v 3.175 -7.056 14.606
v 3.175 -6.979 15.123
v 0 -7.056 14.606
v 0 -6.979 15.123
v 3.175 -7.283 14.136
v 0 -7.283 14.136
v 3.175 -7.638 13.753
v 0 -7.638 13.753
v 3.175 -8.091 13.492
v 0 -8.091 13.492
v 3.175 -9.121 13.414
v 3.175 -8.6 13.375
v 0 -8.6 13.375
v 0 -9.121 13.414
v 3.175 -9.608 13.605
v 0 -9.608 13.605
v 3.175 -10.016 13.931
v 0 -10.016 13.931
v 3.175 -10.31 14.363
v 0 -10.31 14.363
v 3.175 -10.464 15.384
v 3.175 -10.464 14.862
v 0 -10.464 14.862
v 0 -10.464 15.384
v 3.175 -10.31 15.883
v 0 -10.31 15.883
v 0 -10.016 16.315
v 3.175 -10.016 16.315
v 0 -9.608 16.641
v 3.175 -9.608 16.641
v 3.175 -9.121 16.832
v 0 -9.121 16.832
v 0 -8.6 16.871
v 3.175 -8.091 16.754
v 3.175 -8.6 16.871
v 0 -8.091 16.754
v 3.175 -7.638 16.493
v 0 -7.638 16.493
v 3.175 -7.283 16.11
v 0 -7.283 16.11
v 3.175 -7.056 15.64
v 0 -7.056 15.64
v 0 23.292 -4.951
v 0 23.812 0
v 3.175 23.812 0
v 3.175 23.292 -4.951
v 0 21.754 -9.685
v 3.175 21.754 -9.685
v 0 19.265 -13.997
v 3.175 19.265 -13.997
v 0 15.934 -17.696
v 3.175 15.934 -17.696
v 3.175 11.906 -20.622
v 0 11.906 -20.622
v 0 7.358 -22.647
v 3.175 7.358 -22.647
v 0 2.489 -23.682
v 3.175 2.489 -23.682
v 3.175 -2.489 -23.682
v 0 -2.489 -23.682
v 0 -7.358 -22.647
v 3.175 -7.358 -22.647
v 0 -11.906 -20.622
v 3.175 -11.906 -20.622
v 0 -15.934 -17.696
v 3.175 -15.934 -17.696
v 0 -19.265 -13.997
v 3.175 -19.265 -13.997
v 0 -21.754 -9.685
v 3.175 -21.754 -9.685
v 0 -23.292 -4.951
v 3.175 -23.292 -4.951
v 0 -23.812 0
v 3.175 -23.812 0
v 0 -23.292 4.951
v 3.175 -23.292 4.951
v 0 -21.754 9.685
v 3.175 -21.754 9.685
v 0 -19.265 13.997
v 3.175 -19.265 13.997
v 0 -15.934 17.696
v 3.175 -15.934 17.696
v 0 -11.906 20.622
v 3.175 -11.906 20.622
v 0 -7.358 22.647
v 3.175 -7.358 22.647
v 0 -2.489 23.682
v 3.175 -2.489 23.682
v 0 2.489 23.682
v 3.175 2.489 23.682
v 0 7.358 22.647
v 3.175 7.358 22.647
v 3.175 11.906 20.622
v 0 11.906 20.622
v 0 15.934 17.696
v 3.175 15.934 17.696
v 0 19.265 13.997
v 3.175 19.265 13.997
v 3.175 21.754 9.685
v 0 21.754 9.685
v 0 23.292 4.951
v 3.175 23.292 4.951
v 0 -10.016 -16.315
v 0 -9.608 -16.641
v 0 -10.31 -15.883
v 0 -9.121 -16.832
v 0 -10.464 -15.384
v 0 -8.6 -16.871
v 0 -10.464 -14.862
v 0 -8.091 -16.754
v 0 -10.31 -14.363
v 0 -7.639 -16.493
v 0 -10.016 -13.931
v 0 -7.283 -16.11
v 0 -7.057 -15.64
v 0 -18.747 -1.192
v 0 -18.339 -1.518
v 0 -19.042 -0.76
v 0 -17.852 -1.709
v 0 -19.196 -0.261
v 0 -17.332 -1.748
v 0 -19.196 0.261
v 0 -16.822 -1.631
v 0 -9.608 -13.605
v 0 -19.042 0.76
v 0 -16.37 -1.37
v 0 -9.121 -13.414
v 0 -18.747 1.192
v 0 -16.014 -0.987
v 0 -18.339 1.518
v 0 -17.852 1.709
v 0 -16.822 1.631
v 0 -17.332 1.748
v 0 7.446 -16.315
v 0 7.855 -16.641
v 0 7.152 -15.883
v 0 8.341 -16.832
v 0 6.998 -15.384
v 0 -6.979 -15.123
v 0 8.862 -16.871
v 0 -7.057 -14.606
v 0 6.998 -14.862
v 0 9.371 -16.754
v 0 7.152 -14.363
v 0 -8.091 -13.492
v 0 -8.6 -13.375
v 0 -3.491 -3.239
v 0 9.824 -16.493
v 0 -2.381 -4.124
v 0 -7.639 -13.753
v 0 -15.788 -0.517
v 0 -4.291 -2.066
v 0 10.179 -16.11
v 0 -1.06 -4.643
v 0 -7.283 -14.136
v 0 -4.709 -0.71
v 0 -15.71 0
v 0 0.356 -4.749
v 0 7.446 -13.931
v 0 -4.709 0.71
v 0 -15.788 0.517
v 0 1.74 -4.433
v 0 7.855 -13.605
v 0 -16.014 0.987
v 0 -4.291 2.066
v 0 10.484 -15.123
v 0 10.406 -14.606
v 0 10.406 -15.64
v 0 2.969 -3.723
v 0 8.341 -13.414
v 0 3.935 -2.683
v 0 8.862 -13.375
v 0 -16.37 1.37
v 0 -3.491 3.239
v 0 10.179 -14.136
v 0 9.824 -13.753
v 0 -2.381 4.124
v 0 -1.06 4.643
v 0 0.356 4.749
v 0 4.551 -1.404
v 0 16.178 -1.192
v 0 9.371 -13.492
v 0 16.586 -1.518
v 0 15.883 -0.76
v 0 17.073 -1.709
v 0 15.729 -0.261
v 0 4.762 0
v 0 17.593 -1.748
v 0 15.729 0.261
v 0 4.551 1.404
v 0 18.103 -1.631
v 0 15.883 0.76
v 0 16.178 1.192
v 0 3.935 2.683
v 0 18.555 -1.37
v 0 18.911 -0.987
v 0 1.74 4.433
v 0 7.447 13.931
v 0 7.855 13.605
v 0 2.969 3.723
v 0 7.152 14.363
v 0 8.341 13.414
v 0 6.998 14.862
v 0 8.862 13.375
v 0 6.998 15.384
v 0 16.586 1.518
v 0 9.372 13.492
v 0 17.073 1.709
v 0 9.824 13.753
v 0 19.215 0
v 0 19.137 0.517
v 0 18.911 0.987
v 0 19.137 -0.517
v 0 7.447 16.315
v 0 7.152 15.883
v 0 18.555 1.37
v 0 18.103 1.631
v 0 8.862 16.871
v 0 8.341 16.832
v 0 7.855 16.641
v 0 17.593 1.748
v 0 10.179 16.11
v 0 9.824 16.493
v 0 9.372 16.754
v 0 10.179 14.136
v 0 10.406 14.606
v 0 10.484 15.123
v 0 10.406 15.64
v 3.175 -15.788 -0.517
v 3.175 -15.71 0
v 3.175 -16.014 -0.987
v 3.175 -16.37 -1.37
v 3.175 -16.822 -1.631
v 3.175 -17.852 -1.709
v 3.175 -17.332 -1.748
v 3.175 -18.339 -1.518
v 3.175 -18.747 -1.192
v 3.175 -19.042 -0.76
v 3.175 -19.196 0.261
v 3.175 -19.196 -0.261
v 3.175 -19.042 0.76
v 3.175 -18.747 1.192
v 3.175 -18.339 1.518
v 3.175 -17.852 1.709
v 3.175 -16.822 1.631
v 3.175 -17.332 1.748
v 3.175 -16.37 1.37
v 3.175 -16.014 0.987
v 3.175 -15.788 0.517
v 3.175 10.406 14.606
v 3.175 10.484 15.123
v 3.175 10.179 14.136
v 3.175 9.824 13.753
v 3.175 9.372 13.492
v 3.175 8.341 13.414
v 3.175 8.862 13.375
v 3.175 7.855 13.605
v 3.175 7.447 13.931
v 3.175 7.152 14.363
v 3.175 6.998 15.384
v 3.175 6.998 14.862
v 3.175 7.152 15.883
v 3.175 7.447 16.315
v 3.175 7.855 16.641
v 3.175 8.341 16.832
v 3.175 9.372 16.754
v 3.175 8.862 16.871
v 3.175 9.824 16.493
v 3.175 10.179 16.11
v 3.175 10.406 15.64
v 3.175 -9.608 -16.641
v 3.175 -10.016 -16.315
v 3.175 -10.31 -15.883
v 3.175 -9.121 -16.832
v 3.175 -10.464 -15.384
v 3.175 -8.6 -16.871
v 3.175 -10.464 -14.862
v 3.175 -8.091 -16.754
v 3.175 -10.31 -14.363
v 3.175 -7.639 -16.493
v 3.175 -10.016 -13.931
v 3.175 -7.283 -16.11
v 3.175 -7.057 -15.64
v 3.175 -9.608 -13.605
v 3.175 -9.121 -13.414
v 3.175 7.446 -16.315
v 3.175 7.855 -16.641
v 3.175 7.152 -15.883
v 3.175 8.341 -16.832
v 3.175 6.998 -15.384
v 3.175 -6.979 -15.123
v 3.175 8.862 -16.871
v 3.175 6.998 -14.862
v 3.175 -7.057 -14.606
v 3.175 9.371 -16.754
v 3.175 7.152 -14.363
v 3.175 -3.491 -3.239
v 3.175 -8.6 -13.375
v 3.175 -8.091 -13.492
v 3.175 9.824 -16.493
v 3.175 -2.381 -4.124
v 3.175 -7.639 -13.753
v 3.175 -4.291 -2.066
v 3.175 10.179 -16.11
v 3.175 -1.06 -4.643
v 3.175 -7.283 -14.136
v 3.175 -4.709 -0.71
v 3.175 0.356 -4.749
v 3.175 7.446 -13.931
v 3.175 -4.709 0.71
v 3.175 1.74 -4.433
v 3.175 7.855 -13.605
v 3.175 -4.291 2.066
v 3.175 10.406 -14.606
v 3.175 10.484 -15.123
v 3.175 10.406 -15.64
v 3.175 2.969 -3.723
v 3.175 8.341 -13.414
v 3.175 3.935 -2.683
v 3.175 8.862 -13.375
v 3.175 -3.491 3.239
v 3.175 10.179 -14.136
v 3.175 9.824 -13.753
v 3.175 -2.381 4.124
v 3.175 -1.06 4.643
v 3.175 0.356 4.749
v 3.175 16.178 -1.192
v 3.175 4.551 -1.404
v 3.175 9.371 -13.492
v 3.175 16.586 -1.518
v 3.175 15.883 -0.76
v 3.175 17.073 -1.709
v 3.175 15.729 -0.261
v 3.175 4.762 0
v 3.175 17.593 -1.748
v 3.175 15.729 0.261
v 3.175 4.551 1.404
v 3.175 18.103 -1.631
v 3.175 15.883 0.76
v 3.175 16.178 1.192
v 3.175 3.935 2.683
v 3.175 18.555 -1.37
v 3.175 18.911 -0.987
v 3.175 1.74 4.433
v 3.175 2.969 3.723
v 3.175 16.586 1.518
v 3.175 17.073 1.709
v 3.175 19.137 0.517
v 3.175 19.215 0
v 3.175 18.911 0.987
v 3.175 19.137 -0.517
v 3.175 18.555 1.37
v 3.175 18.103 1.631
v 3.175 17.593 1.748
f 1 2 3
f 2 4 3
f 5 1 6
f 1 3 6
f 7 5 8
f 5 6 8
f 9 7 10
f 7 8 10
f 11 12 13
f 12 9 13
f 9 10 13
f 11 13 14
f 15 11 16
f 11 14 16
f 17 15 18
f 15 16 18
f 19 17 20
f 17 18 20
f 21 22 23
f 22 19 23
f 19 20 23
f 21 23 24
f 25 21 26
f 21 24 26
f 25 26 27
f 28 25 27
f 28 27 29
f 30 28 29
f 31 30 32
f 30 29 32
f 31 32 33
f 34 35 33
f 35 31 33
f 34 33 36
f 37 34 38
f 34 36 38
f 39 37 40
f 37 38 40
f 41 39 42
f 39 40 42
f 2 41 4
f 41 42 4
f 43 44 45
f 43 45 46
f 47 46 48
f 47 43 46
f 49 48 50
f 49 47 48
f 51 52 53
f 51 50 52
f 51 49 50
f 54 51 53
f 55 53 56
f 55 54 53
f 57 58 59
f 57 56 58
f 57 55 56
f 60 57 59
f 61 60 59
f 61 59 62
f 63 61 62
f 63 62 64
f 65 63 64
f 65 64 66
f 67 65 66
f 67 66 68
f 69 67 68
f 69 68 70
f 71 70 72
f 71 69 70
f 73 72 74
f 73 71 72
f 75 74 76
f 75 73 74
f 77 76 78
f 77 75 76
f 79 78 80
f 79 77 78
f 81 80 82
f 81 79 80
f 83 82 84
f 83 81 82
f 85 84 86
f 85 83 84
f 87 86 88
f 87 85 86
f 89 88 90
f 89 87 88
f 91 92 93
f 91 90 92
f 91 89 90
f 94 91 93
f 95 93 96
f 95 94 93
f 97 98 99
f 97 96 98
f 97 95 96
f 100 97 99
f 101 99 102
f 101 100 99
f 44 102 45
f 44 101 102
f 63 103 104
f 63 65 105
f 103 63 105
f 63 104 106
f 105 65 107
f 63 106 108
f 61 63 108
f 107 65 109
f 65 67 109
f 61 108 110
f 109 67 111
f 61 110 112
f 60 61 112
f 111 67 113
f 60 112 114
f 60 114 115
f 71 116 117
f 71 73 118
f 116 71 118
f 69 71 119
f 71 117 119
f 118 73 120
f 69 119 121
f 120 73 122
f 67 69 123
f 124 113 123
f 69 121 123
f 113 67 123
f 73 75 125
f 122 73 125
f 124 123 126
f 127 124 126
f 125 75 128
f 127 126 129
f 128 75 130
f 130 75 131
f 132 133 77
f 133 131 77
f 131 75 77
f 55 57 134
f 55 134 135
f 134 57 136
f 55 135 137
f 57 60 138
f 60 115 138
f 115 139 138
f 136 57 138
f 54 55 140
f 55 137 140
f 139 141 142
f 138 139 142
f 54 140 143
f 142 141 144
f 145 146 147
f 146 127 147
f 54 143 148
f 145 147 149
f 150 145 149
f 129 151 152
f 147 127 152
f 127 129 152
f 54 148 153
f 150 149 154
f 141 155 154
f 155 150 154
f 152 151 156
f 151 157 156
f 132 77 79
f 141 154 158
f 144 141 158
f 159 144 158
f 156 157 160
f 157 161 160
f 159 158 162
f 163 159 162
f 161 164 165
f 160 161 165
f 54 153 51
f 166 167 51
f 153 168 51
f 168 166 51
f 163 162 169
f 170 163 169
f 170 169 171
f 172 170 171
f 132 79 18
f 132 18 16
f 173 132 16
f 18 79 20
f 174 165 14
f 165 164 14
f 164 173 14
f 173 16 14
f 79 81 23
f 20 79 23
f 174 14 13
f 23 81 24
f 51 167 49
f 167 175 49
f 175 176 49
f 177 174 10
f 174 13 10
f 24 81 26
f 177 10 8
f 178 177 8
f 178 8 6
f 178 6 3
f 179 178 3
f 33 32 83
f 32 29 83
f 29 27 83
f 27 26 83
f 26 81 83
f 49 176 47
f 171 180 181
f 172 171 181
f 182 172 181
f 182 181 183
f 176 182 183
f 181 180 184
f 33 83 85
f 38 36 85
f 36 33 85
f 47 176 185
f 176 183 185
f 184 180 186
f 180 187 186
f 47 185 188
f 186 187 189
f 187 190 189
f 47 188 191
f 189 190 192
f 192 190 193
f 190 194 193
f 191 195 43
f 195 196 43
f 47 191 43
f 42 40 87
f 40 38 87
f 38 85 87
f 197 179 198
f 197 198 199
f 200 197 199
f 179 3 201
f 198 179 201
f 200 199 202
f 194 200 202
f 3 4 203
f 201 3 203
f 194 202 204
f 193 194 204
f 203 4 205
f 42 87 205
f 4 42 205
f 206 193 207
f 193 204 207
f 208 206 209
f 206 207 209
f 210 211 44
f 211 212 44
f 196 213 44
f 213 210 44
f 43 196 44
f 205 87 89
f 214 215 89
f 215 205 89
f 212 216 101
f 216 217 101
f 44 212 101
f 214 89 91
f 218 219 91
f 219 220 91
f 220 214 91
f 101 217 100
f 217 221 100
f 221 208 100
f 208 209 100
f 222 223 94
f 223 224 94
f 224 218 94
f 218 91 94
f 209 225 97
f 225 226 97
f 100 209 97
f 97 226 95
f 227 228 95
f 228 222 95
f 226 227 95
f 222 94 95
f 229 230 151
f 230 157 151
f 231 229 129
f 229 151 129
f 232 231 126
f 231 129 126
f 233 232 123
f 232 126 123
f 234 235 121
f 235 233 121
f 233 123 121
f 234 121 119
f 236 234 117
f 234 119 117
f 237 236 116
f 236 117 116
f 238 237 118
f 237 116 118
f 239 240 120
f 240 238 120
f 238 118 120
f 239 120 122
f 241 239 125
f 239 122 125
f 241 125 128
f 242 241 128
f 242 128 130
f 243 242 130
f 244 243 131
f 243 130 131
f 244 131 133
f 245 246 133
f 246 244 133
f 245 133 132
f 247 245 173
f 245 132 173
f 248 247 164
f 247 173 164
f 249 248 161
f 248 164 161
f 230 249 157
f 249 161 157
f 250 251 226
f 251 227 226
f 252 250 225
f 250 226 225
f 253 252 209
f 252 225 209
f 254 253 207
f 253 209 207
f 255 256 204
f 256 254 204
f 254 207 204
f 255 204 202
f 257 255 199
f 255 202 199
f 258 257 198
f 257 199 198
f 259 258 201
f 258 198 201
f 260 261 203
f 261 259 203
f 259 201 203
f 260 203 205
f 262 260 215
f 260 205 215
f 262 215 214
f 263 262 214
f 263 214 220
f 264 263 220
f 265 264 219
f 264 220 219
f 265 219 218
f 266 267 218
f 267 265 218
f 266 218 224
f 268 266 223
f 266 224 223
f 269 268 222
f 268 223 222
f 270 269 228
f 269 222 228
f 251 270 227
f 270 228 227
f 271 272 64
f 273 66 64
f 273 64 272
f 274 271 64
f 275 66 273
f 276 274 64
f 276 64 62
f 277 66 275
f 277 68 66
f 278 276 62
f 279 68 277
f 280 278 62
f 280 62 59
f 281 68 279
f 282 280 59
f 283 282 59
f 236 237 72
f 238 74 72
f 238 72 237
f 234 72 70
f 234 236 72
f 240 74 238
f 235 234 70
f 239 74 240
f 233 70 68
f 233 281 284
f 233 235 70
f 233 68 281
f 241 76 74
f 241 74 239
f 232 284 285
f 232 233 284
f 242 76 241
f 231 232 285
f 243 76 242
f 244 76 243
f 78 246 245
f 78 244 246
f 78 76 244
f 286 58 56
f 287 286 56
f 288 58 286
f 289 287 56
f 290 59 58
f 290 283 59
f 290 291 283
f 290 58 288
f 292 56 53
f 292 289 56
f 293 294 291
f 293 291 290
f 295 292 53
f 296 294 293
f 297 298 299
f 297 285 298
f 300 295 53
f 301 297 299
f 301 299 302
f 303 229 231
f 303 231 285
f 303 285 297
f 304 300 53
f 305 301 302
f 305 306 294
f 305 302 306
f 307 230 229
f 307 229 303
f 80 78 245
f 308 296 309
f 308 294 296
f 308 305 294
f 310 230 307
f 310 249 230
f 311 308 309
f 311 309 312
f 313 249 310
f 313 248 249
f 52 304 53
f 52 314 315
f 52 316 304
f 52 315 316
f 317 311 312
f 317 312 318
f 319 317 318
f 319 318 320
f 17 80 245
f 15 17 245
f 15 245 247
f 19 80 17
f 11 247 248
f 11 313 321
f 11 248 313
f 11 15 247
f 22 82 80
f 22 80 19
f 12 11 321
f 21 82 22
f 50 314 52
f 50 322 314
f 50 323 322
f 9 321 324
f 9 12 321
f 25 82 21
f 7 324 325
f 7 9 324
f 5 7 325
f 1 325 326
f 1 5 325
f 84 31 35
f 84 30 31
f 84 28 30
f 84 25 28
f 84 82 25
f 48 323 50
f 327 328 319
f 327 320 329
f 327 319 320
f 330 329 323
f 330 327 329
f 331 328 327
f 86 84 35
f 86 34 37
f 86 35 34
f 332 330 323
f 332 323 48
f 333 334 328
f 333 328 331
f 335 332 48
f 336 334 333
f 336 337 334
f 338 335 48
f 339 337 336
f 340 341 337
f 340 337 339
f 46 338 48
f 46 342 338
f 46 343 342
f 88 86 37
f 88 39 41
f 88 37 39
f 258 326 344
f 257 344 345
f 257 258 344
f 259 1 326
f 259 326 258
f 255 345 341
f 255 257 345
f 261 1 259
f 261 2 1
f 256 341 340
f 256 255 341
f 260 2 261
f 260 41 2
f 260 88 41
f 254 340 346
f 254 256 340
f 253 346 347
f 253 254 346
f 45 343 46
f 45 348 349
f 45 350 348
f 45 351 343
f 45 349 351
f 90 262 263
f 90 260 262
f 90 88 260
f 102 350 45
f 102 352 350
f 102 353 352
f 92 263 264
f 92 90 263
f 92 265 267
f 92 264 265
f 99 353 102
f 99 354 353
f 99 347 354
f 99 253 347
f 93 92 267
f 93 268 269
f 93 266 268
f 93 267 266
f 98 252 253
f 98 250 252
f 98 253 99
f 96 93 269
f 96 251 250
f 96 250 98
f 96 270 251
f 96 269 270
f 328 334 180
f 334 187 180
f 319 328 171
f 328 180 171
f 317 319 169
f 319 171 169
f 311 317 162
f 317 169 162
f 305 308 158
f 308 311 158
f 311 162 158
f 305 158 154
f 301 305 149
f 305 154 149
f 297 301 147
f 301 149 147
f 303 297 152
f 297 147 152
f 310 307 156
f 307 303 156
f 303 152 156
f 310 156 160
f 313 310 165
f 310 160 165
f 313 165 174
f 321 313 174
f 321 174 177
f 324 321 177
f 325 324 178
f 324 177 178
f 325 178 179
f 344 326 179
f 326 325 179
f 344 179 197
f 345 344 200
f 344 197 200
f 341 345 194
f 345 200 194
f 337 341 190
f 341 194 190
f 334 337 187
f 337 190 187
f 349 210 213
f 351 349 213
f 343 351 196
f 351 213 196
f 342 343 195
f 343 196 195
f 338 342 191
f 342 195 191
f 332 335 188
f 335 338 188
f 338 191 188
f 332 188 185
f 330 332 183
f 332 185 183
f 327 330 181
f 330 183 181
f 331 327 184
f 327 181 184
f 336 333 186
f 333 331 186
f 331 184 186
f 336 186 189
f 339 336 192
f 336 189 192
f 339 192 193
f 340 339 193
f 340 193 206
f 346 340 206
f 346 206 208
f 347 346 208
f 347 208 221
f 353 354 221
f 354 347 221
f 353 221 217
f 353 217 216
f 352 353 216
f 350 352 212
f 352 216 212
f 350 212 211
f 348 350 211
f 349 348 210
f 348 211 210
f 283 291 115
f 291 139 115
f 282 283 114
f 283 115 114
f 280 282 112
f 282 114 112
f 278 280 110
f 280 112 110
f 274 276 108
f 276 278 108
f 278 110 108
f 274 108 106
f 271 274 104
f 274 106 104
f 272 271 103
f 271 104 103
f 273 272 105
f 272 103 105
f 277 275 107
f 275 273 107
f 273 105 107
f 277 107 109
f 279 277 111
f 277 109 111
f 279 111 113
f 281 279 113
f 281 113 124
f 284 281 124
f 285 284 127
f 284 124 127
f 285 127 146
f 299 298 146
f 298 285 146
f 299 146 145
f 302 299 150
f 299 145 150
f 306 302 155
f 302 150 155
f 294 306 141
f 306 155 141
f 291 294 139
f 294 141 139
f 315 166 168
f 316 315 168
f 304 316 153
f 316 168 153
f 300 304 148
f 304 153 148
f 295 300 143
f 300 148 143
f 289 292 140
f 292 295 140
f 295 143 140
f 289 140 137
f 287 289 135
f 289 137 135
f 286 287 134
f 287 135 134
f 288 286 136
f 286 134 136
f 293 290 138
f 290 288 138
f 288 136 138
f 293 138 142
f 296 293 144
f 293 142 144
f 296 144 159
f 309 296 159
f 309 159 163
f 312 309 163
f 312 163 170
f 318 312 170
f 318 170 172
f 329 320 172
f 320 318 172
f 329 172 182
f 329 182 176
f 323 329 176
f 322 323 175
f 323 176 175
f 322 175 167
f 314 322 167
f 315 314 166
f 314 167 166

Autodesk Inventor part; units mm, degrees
ref_plane "YZ Plane" through (0, 0, 0) normal (1, 0, 0) x (0, 1, 0)
ref_plane "XZ Plane" through (0, 0, 0) normal (0, 1, 0) x (-1, 0, 0)
ref_plane "XY Plane" through (0, 0, 0) normal (0, 0, 1) x (1, 0, 0)
sketch "Sketch1" plane through (0, 0, 0) normal (1, 0, 0) x (0, 1, 0)
  circle A0 centre (0, 0) radius 23.8125
  circle A1 centre (0, 0) radius 17.4625 construction
  line L0 (0, 0) -> (23.8125, 0) construction
  circle A2 centre (17.4625, 0) radius 1.7526
  circle A3 centre (8.7313, 15.123) radius 1.7526
  circle A4 centre (-8.7312, 15.123) radius 1.7526
  circle A5 centre (-17.4625, 0) radius 1.7526
  circle A6 centre (-8.7313, -15.123) radius 1.7526
  circle A7 centre (8.7312, -15.123) radius 1.7526
  circle A8 centre (0, 0) radius 4.7625
  dimension "d0" = 47.625
  dimension "d1" = 34.925
  dimension "d2" = 3.5052
  dimension "d5" = 360
  dimension "d9" = 9.525
extrude "Extrusion1" add sketch "Sketch1" along normal blind 3.175
properties part number "Wheel Cover" material "UHMW, White"
